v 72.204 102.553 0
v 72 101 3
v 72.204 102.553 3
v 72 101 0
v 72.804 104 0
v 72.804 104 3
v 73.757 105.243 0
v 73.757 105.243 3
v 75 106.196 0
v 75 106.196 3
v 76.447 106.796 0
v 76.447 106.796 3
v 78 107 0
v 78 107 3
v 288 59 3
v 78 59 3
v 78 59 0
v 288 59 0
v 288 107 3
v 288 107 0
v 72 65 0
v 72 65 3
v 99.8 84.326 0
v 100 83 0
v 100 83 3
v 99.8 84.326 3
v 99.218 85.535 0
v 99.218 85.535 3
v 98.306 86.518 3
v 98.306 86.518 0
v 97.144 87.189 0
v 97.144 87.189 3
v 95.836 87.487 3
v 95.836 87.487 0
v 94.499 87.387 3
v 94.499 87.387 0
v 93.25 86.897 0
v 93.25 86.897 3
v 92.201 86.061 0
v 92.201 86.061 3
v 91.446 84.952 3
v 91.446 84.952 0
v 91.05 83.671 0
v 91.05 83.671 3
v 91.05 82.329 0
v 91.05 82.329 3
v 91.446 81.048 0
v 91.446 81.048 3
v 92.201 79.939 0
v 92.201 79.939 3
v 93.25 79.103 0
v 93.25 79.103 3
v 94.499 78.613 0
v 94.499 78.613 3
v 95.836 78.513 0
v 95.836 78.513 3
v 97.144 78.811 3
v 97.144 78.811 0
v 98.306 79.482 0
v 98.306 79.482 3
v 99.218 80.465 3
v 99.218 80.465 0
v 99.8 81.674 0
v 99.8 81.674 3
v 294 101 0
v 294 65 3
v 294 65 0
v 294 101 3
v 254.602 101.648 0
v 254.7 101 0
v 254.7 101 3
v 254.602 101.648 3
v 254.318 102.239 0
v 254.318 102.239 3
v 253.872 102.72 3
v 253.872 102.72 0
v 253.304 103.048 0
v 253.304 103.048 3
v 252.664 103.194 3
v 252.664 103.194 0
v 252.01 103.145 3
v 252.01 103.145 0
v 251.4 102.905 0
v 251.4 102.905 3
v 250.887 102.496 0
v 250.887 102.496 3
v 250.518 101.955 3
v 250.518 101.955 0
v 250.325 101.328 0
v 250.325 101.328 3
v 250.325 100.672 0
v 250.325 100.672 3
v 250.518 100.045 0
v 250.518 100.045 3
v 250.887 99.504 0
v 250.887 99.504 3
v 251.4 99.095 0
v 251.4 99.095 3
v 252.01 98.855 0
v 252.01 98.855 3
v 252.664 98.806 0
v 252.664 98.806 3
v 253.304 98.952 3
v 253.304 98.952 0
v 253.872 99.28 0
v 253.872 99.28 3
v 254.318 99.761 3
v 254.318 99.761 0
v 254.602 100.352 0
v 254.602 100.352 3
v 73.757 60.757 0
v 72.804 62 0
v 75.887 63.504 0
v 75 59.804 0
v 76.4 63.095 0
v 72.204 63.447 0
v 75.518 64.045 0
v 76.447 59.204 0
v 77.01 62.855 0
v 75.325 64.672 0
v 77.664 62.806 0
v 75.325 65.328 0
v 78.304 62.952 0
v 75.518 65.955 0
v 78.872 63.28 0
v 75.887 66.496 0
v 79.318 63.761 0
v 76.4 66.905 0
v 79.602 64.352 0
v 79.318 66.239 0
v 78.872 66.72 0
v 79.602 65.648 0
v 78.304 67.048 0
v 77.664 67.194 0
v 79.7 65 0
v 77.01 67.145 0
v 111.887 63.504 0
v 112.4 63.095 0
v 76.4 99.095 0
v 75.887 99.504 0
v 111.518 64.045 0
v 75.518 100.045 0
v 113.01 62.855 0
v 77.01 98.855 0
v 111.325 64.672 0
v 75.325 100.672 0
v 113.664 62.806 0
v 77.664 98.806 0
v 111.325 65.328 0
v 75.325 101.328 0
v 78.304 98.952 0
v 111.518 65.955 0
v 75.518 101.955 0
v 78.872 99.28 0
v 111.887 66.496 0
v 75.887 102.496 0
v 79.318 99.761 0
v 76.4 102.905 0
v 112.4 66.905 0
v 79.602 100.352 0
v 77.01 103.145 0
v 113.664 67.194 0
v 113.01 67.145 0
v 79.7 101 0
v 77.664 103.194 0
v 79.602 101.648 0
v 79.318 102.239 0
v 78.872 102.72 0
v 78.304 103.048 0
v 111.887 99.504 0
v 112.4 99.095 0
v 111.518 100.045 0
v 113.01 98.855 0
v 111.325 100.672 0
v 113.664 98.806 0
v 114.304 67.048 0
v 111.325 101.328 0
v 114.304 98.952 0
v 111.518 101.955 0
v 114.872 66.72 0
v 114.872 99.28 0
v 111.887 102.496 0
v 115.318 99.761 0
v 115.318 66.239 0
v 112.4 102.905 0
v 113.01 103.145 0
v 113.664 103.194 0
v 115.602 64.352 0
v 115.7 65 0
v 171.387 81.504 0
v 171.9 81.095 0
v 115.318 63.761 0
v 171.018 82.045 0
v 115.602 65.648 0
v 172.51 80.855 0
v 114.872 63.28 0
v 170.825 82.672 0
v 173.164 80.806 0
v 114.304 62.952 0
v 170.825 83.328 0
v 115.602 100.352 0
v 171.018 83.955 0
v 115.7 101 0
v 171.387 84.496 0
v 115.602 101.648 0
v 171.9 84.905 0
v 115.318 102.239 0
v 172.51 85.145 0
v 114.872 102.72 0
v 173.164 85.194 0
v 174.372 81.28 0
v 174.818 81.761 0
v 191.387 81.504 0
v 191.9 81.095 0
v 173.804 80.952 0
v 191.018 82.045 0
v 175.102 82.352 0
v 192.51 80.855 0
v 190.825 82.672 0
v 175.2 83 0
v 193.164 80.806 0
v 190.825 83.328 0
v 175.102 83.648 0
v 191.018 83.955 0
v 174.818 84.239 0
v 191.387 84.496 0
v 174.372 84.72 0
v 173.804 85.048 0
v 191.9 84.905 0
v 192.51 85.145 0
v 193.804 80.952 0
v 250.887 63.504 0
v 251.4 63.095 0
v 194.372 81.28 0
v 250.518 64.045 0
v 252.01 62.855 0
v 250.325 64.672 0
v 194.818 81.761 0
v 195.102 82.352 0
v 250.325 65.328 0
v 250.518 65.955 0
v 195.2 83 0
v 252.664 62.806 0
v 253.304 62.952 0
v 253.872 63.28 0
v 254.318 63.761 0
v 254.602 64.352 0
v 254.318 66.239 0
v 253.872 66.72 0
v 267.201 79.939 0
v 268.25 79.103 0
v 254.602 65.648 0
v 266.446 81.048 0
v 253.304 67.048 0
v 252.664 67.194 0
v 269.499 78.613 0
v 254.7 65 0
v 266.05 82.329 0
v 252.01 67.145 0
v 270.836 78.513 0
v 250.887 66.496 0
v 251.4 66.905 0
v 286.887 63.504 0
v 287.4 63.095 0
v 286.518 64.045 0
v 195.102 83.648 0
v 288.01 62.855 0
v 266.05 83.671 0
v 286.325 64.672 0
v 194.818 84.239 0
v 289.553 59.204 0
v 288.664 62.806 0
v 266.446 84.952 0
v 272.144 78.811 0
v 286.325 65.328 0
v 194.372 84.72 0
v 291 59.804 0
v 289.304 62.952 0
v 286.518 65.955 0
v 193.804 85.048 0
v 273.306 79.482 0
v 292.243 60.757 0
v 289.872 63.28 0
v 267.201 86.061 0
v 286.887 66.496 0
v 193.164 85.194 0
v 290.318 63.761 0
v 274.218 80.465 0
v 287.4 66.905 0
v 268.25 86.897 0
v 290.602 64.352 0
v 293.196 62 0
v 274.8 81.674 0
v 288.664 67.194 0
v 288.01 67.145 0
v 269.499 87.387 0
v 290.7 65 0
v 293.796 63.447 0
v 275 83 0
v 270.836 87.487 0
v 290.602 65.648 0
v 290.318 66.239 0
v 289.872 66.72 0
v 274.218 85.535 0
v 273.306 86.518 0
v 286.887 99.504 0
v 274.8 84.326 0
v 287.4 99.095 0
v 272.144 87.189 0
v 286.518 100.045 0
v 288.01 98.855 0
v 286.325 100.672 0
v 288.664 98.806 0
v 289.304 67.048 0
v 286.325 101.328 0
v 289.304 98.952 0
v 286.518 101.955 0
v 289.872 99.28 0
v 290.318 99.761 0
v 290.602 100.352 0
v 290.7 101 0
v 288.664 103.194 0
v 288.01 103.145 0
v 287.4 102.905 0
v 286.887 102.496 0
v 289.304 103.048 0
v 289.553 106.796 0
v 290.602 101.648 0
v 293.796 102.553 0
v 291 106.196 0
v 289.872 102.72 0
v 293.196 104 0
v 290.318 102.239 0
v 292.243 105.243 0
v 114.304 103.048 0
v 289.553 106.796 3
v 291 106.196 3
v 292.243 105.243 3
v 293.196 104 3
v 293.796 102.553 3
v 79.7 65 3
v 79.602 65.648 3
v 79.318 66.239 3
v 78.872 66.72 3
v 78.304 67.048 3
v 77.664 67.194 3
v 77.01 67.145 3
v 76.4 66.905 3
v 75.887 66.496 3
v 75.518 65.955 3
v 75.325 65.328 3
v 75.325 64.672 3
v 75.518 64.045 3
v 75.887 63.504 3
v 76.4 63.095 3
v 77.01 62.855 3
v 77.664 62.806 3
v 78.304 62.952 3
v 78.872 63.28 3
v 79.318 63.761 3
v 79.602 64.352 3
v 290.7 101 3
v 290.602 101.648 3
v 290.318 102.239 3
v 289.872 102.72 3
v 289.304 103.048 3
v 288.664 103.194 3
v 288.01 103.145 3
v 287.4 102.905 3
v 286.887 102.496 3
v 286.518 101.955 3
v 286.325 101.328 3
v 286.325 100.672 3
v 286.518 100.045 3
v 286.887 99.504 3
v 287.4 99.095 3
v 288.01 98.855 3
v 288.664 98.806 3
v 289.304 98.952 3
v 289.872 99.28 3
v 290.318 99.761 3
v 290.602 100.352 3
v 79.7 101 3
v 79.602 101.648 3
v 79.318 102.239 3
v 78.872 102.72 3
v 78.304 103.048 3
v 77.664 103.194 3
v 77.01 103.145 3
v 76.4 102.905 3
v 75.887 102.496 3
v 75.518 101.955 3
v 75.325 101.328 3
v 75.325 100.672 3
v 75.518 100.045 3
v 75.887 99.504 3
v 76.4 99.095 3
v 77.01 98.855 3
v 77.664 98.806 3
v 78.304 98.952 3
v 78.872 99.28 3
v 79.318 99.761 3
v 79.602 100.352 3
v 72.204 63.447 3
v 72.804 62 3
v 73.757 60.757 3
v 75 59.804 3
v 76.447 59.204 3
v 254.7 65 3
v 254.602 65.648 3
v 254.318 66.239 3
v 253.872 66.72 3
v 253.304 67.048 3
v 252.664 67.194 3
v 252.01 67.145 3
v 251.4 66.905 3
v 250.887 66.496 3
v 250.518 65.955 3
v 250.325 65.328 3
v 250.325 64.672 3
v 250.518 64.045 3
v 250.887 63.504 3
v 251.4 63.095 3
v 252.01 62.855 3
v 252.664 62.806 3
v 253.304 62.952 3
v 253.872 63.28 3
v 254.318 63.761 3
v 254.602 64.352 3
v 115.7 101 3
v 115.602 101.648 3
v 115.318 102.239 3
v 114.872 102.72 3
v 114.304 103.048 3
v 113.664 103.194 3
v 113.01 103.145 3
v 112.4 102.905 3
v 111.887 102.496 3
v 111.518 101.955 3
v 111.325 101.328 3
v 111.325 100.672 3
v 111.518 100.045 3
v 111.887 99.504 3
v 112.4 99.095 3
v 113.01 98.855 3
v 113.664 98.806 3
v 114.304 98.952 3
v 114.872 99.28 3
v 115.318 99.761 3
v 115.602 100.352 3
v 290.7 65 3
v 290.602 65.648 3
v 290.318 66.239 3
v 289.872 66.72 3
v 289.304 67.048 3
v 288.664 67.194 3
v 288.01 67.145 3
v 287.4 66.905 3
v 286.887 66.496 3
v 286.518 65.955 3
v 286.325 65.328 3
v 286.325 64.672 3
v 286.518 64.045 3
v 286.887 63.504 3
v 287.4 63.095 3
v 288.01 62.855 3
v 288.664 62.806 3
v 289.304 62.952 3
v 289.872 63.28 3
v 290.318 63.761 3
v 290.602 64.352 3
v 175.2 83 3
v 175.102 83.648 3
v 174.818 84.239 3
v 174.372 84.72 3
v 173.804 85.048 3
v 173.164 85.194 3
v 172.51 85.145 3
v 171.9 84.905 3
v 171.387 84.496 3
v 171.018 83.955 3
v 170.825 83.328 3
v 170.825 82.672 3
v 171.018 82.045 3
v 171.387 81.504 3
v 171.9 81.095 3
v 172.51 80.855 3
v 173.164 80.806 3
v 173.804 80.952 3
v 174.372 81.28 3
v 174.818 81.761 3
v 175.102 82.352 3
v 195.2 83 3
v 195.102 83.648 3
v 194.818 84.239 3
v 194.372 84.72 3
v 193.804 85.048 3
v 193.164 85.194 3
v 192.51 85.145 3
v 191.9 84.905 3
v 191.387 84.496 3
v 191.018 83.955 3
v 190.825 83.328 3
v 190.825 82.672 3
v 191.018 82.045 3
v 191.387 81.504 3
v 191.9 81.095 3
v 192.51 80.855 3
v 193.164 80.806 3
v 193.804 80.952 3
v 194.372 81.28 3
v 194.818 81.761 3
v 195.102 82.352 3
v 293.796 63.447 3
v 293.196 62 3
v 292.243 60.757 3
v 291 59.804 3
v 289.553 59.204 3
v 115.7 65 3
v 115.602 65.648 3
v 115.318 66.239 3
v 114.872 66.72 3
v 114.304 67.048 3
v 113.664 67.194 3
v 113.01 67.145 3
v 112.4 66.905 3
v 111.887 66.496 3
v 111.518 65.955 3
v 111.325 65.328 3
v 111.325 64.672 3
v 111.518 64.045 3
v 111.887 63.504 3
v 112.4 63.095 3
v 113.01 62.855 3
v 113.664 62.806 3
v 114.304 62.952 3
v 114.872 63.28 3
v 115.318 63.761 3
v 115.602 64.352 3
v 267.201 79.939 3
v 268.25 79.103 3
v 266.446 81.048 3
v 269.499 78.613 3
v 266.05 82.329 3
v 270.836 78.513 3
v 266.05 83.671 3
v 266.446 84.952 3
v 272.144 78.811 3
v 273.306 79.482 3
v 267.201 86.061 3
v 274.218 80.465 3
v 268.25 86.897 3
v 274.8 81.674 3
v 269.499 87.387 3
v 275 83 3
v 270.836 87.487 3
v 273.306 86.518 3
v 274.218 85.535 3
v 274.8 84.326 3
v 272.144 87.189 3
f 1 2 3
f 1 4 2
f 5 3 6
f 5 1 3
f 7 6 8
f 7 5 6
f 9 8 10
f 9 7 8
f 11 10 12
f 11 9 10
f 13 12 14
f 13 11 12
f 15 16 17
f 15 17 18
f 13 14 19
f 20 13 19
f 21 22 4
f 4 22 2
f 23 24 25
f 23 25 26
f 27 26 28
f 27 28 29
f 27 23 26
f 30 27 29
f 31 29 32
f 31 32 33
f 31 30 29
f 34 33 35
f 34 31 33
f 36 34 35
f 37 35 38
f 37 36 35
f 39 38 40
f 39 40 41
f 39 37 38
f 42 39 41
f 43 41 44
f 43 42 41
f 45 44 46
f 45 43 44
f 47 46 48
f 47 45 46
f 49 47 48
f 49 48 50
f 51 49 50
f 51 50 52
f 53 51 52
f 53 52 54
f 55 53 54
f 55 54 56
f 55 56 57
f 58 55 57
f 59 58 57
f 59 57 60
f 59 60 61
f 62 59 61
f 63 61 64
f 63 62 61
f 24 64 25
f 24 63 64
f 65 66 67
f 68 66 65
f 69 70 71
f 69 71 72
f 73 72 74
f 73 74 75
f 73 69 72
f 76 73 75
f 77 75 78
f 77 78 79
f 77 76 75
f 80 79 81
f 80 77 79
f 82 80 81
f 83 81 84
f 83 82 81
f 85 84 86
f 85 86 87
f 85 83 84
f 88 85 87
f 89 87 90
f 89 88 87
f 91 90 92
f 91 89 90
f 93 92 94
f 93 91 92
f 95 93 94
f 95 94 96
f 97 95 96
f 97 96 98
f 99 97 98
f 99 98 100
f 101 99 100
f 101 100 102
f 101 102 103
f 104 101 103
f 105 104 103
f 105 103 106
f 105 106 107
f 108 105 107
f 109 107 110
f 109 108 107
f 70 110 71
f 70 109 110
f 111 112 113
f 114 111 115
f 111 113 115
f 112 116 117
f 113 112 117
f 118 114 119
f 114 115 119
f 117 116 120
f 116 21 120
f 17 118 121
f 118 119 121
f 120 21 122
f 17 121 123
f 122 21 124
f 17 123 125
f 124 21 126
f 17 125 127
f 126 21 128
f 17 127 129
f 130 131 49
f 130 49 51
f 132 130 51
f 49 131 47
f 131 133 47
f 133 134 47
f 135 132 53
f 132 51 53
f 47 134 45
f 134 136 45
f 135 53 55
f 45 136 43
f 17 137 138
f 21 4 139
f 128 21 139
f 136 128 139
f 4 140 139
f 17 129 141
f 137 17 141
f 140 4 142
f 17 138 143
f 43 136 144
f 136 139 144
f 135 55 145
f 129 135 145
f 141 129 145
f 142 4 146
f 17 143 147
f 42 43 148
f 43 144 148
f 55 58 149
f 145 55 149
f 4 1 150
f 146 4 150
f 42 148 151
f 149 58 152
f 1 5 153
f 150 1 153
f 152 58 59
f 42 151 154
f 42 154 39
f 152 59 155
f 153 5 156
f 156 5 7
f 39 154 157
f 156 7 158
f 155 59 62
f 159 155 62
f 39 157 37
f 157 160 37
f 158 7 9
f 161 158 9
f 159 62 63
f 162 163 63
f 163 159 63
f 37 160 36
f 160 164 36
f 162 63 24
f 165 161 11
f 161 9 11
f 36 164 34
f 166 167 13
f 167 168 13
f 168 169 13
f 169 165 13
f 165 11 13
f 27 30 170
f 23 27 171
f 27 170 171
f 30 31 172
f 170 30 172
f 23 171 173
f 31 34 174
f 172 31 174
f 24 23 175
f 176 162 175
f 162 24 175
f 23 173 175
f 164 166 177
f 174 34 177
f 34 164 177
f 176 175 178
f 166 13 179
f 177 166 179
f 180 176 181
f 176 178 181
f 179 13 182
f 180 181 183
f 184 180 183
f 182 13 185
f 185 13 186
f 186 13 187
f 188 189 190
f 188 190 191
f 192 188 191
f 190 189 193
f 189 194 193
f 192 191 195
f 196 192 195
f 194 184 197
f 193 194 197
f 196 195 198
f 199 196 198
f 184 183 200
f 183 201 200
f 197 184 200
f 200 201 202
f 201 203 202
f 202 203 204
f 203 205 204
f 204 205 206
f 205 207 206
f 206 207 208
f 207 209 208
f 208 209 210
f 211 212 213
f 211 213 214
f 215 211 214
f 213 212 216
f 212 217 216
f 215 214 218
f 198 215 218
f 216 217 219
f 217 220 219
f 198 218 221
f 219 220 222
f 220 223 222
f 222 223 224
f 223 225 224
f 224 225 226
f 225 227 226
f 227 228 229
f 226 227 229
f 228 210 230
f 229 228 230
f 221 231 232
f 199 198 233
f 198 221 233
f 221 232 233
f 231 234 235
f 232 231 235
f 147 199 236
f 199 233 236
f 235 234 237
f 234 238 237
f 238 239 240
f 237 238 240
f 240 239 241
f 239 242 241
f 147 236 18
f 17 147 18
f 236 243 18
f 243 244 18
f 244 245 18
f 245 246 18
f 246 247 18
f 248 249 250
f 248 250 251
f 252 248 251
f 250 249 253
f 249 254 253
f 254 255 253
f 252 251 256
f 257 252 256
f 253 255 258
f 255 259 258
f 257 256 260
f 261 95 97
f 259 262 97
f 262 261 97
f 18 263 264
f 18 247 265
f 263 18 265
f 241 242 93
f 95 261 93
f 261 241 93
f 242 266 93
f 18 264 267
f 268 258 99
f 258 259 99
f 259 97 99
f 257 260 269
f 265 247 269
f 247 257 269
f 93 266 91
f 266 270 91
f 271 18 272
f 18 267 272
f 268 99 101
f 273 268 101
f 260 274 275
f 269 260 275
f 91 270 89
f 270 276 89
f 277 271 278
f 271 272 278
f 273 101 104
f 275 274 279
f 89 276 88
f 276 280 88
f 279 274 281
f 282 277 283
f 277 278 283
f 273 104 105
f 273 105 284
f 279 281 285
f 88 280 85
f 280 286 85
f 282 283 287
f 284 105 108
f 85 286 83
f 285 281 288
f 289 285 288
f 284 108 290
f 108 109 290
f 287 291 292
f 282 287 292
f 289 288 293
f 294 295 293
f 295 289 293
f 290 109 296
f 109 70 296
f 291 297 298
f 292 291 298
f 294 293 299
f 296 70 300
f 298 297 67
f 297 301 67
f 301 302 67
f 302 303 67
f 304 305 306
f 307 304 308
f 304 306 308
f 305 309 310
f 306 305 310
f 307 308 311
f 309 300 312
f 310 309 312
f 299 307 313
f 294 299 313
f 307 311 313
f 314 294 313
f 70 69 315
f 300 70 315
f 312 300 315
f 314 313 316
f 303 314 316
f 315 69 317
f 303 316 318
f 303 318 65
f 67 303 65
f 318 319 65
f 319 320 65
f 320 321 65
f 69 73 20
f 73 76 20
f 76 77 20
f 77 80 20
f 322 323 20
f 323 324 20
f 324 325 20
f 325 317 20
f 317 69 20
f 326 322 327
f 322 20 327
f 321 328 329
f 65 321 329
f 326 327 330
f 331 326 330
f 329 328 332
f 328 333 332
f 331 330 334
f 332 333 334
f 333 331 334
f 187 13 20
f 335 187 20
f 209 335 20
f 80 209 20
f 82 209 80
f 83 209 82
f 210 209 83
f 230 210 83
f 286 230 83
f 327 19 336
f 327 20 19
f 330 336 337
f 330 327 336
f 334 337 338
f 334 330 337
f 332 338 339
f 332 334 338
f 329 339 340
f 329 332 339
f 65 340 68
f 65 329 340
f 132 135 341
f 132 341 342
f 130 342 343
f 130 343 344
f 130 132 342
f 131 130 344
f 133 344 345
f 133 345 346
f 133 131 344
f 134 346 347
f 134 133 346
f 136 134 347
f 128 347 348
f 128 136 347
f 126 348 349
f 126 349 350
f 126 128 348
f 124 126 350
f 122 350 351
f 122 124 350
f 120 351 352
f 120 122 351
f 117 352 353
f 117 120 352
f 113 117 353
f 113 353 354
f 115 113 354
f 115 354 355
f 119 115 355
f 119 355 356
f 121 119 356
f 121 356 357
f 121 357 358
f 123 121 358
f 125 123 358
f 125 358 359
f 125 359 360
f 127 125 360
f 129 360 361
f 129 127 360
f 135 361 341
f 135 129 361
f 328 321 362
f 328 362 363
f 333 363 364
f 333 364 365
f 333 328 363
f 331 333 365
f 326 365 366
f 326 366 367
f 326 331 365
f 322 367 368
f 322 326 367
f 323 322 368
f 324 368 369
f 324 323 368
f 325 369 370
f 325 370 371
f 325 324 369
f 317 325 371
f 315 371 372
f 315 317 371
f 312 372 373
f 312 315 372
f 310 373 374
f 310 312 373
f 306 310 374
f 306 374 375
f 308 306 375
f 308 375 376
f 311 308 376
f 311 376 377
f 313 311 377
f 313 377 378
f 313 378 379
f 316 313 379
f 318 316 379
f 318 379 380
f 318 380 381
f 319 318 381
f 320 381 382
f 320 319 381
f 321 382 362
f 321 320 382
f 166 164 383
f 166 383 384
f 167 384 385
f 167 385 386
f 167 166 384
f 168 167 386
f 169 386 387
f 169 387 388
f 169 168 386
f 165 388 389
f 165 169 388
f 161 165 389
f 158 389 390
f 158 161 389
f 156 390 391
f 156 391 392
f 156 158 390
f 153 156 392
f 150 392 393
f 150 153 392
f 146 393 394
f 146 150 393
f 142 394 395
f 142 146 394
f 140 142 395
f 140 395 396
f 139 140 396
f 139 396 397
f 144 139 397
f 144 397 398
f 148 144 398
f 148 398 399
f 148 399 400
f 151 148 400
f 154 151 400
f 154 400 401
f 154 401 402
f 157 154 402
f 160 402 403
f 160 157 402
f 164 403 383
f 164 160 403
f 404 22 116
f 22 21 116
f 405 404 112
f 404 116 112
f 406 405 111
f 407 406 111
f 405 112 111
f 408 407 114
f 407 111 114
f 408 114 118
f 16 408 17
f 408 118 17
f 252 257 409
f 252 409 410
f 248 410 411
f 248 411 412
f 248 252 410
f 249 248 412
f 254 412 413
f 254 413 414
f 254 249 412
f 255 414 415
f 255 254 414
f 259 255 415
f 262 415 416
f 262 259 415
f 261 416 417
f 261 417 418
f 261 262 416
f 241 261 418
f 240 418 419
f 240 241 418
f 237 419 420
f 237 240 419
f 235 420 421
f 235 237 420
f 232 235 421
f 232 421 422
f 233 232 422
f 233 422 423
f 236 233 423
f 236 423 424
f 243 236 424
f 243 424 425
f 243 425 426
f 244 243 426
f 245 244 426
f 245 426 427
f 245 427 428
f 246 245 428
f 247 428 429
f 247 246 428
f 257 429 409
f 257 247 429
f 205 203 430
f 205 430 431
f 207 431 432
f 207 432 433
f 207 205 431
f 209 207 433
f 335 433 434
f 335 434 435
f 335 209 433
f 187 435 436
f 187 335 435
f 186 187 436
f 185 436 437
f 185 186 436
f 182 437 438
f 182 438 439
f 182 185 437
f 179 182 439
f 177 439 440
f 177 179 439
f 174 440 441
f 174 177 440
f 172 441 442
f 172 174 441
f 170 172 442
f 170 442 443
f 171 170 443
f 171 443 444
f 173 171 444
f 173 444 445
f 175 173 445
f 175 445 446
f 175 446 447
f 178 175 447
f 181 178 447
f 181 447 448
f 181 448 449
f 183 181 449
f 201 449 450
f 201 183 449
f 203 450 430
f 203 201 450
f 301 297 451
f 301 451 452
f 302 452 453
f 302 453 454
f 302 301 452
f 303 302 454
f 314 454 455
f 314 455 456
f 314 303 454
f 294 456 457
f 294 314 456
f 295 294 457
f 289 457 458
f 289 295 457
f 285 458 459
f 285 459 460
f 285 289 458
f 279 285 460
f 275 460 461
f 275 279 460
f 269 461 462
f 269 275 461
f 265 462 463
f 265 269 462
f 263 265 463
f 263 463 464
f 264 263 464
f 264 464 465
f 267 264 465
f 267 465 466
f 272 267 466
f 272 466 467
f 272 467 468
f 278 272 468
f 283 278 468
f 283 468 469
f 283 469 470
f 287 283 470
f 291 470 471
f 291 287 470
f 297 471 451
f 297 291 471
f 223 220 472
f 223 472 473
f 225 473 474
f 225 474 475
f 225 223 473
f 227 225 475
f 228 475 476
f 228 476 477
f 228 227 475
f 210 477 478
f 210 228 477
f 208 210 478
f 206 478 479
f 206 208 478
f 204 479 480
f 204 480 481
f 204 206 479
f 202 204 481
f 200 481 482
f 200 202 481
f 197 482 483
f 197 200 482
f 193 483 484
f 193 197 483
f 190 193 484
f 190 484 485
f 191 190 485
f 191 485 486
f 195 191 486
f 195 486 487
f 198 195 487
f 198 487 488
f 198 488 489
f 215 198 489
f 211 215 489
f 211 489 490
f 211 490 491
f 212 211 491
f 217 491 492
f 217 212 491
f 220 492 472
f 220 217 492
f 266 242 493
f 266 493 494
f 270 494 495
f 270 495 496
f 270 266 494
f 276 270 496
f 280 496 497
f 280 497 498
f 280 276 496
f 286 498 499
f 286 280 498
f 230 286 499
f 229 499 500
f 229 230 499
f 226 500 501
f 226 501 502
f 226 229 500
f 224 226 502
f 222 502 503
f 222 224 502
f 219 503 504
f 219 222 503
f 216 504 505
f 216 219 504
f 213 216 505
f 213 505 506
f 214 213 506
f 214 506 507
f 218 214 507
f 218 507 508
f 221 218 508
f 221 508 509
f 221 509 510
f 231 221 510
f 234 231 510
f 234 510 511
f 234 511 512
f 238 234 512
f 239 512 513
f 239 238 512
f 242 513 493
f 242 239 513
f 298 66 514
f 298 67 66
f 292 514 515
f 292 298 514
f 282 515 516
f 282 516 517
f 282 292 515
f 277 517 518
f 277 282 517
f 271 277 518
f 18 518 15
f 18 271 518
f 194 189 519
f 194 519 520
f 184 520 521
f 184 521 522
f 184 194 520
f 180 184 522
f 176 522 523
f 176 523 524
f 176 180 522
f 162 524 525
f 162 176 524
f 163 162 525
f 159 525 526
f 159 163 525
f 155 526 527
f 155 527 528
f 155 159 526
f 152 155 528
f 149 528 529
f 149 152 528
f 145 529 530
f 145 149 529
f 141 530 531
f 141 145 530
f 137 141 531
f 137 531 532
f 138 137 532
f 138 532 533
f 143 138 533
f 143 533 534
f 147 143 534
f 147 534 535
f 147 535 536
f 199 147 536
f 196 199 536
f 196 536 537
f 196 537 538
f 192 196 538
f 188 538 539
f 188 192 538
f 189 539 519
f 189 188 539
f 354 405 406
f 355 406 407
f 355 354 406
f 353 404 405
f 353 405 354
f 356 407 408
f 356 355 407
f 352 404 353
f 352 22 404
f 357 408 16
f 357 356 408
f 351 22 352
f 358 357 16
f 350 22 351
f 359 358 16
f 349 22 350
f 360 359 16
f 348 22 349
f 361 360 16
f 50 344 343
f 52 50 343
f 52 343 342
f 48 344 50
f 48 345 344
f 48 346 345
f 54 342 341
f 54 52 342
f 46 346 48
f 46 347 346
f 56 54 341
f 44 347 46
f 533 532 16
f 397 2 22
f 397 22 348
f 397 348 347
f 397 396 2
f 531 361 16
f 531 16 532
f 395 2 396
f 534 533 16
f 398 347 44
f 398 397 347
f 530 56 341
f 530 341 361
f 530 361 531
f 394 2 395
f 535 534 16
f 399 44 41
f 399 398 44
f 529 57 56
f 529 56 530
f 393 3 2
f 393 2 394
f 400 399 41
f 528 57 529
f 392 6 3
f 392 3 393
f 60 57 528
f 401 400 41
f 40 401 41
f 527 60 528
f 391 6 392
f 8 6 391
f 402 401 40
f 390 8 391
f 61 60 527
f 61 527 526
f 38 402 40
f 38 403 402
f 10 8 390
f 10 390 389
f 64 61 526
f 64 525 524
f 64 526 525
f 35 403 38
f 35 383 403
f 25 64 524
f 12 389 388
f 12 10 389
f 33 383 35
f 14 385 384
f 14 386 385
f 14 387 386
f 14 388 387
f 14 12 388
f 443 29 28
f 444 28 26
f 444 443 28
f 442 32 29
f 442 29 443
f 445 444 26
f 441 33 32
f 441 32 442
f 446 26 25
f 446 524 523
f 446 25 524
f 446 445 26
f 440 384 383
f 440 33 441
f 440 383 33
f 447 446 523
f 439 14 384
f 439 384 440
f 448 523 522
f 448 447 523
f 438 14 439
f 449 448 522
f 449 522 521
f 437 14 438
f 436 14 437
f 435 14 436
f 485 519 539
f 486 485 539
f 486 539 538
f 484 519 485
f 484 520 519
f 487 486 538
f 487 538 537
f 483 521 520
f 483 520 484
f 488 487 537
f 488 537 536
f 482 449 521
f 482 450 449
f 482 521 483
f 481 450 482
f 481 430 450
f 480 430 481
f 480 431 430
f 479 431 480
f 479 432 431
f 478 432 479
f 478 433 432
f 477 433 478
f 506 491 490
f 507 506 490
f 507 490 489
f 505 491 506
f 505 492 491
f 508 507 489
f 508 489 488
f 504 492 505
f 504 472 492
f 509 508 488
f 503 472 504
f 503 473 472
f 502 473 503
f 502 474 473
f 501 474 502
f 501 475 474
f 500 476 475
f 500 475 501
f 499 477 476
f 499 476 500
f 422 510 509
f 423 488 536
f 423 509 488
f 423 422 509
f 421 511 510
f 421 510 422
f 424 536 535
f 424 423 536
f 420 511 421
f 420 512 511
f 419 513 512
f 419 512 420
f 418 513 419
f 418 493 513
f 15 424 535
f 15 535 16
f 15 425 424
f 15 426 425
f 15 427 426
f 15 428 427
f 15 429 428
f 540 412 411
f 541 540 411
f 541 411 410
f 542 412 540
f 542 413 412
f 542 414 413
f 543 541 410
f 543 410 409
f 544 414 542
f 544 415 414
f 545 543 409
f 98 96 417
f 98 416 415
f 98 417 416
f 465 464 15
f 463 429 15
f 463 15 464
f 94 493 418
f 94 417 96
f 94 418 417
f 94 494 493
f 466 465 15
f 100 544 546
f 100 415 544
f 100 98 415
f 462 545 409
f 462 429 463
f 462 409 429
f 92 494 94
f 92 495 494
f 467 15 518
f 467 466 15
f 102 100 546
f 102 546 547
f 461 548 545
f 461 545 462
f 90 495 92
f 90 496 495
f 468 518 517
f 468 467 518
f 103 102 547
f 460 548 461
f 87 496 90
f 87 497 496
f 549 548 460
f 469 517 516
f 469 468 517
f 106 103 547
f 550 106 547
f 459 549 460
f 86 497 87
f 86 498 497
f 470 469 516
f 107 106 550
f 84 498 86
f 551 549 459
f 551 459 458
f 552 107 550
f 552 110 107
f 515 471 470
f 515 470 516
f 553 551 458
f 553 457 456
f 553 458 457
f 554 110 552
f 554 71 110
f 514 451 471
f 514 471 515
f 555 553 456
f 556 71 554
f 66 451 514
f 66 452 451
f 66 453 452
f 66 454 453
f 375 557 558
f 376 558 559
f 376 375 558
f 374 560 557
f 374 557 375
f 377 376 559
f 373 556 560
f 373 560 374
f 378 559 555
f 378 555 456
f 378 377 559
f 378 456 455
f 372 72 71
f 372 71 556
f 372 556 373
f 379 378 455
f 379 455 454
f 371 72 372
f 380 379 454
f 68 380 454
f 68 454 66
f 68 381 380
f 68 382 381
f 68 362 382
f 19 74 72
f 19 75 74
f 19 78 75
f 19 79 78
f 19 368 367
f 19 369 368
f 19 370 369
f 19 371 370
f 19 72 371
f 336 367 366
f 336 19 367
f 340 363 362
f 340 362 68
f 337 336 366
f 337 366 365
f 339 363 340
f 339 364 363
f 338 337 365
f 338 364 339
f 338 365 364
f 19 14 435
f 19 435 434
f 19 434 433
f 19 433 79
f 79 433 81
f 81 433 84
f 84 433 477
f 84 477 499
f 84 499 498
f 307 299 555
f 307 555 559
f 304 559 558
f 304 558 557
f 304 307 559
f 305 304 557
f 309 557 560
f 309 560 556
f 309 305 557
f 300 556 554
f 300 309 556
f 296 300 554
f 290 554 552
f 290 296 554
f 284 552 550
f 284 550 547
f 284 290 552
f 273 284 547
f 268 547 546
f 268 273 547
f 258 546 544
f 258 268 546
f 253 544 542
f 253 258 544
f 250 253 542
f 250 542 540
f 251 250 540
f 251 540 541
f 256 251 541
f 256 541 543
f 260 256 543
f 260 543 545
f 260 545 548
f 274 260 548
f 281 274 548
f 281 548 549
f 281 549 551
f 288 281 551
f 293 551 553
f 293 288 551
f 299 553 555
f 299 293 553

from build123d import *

# Parameters (mm, degrees)
ESQUISSE1_W             = 366
ESQUISSE1_H             = 166
ESQUISSE1_R             = 2.2
ESQUISSE1_R_2           = 4.5
ESQUISSE1_R_3           = 6.5
BOSS_EXTRU_1_DEPTH      = 3
ESQUISSE2_OUTSIDE_W     = 448.38
ESQUISSE2_OUTSIDE_H     = 248.38
ESQUISSE2_OUTSIDE_W_2   = 222
ESQUISSE2_OUTSIDE_H_2   = 48
ENL_V_MAT_EXTRU_1_DEPTH = 4
CONG_1_R                = 6


with BuildPart() as part:
    # Esquisse1 → Boss.-Extru.1 (new body)
    with BuildSketch(Plane.XY):
        with Locations((183, 83)):
            Rectangle(ESQUISSE1_W, ESQUISSE1_H)
        with Locations((13, 153)):
            Circle(ESQUISSE1_R, mode=Mode.SUBTRACT)
        with Locations((13, 13)):
            Circle(ESQUISSE1_R, mode=Mode.SUBTRACT)
        with Locations((13, 83)):
            Circle(ESQUISSE1_R, mode=Mode.SUBTRACT)
        with Locations((173, 153)):
            Circle(ESQUISSE1_R, mode=Mode.SUBTRACT)
        with Locations((193, 83)):
            Circle(ESQUISSE1_R, mode=Mode.SUBTRACT)
        with Locations((173, 83)):
            Circle(ESQUISSE1_R, mode=Mode.SUBTRACT)
        with Locations((193, 153)):
            Circle(ESQUISSE1_R, mode=Mode.SUBTRACT)
        with Locations((353, 83)):
            Circle(ESQUISSE1_R, mode=Mode.SUBTRACT)
        with Locations((353, 13)):
            Circle(ESQUISSE1_R, mode=Mode.SUBTRACT)
        with Locations((353, 153)):
            Circle(ESQUISSE1_R, mode=Mode.SUBTRACT)
        with Locations((193, 13)):
            Circle(ESQUISSE1_R, mode=Mode.SUBTRACT)
        with Locations((173, 13)):
            Circle(ESQUISSE1_R, mode=Mode.SUBTRACT)
        with Locations((270.5, 83)):
            Circle(ESQUISSE1_R_2, mode=Mode.SUBTRACT)
        with Locations((95.5, 83)):
            Circle(ESQUISSE1_R_2, mode=Mode.SUBTRACT)
        with Locations((77.5, 101)):
            Circle(ESQUISSE1_R, mode=Mode.SUBTRACT)
        with Locations((113.5, 101)):
            Circle(ESQUISSE1_R, mode=Mode.SUBTRACT)
        with Locations((77.5, 65)):
            Circle(ESQUISSE1_R, mode=Mode.SUBTRACT)
        with Locations((113.5, 65)):
            Circle(ESQUISSE1_R, mode=Mode.SUBTRACT)
        with Locations((288.5, 65)):
            Circle(ESQUISSE1_R, mode=Mode.SUBTRACT)
        with Locations((252.5, 65)):
            Circle(ESQUISSE1_R, mode=Mode.SUBTRACT)
        with Locations((252.5, 101)):
            Circle(ESQUISSE1_R, mode=Mode.SUBTRACT)
        with Locations((288.5, 101)):
            Circle(ESQUISSE1_R, mode=Mode.SUBTRACT)
        with Locations((37, 49)):
            Circle(ESQUISSE1_R_3, mode=Mode.SUBTRACT)
        with Locations((61, 49)):
            Circle(ESQUISSE1_R_3, mode=Mode.SUBTRACT)
        with Locations((85, 49)):
            Circle(ESQUISSE1_R, mode=Mode.SUBTRACT)
        with Locations((13, 49)):
            Circle(ESQUISSE1_R, mode=Mode.SUBTRACT)
    extrude(amount=BOSS_EXTRU_1_DEPTH)

    # Esquisse2 outside → Enlèv. mat.-Extru.1 (cut, through all)
    with BuildSketch(Plane.XY.offset(3)):
        with Locations((183, 83)):
            Rectangle(ESQUISSE2_OUTSIDE_W, ESQUISSE2_OUTSIDE_H)
        with Locations((183, 83)):
            Rectangle(ESQUISSE2_OUTSIDE_W_2, ESQUISSE2_OUTSIDE_H_2, mode=Mode.SUBTRACT)
    extrude(amount=-ENL_V_MAT_EXTRU_1_DEPTH, mode=Mode.SUBTRACT)

    # Congé1
    cong_1_edges = [part.edges().sort_by_distance(p)[0] for p in [
        (72, 107, 1.5),
        (294, 107, 1.5),
        (294, 59, 1.5),
        (72, 59, 1.5),
    ]]
    fillet(cong_1_edges, radius=CONG_1_R)


solid = part.part
